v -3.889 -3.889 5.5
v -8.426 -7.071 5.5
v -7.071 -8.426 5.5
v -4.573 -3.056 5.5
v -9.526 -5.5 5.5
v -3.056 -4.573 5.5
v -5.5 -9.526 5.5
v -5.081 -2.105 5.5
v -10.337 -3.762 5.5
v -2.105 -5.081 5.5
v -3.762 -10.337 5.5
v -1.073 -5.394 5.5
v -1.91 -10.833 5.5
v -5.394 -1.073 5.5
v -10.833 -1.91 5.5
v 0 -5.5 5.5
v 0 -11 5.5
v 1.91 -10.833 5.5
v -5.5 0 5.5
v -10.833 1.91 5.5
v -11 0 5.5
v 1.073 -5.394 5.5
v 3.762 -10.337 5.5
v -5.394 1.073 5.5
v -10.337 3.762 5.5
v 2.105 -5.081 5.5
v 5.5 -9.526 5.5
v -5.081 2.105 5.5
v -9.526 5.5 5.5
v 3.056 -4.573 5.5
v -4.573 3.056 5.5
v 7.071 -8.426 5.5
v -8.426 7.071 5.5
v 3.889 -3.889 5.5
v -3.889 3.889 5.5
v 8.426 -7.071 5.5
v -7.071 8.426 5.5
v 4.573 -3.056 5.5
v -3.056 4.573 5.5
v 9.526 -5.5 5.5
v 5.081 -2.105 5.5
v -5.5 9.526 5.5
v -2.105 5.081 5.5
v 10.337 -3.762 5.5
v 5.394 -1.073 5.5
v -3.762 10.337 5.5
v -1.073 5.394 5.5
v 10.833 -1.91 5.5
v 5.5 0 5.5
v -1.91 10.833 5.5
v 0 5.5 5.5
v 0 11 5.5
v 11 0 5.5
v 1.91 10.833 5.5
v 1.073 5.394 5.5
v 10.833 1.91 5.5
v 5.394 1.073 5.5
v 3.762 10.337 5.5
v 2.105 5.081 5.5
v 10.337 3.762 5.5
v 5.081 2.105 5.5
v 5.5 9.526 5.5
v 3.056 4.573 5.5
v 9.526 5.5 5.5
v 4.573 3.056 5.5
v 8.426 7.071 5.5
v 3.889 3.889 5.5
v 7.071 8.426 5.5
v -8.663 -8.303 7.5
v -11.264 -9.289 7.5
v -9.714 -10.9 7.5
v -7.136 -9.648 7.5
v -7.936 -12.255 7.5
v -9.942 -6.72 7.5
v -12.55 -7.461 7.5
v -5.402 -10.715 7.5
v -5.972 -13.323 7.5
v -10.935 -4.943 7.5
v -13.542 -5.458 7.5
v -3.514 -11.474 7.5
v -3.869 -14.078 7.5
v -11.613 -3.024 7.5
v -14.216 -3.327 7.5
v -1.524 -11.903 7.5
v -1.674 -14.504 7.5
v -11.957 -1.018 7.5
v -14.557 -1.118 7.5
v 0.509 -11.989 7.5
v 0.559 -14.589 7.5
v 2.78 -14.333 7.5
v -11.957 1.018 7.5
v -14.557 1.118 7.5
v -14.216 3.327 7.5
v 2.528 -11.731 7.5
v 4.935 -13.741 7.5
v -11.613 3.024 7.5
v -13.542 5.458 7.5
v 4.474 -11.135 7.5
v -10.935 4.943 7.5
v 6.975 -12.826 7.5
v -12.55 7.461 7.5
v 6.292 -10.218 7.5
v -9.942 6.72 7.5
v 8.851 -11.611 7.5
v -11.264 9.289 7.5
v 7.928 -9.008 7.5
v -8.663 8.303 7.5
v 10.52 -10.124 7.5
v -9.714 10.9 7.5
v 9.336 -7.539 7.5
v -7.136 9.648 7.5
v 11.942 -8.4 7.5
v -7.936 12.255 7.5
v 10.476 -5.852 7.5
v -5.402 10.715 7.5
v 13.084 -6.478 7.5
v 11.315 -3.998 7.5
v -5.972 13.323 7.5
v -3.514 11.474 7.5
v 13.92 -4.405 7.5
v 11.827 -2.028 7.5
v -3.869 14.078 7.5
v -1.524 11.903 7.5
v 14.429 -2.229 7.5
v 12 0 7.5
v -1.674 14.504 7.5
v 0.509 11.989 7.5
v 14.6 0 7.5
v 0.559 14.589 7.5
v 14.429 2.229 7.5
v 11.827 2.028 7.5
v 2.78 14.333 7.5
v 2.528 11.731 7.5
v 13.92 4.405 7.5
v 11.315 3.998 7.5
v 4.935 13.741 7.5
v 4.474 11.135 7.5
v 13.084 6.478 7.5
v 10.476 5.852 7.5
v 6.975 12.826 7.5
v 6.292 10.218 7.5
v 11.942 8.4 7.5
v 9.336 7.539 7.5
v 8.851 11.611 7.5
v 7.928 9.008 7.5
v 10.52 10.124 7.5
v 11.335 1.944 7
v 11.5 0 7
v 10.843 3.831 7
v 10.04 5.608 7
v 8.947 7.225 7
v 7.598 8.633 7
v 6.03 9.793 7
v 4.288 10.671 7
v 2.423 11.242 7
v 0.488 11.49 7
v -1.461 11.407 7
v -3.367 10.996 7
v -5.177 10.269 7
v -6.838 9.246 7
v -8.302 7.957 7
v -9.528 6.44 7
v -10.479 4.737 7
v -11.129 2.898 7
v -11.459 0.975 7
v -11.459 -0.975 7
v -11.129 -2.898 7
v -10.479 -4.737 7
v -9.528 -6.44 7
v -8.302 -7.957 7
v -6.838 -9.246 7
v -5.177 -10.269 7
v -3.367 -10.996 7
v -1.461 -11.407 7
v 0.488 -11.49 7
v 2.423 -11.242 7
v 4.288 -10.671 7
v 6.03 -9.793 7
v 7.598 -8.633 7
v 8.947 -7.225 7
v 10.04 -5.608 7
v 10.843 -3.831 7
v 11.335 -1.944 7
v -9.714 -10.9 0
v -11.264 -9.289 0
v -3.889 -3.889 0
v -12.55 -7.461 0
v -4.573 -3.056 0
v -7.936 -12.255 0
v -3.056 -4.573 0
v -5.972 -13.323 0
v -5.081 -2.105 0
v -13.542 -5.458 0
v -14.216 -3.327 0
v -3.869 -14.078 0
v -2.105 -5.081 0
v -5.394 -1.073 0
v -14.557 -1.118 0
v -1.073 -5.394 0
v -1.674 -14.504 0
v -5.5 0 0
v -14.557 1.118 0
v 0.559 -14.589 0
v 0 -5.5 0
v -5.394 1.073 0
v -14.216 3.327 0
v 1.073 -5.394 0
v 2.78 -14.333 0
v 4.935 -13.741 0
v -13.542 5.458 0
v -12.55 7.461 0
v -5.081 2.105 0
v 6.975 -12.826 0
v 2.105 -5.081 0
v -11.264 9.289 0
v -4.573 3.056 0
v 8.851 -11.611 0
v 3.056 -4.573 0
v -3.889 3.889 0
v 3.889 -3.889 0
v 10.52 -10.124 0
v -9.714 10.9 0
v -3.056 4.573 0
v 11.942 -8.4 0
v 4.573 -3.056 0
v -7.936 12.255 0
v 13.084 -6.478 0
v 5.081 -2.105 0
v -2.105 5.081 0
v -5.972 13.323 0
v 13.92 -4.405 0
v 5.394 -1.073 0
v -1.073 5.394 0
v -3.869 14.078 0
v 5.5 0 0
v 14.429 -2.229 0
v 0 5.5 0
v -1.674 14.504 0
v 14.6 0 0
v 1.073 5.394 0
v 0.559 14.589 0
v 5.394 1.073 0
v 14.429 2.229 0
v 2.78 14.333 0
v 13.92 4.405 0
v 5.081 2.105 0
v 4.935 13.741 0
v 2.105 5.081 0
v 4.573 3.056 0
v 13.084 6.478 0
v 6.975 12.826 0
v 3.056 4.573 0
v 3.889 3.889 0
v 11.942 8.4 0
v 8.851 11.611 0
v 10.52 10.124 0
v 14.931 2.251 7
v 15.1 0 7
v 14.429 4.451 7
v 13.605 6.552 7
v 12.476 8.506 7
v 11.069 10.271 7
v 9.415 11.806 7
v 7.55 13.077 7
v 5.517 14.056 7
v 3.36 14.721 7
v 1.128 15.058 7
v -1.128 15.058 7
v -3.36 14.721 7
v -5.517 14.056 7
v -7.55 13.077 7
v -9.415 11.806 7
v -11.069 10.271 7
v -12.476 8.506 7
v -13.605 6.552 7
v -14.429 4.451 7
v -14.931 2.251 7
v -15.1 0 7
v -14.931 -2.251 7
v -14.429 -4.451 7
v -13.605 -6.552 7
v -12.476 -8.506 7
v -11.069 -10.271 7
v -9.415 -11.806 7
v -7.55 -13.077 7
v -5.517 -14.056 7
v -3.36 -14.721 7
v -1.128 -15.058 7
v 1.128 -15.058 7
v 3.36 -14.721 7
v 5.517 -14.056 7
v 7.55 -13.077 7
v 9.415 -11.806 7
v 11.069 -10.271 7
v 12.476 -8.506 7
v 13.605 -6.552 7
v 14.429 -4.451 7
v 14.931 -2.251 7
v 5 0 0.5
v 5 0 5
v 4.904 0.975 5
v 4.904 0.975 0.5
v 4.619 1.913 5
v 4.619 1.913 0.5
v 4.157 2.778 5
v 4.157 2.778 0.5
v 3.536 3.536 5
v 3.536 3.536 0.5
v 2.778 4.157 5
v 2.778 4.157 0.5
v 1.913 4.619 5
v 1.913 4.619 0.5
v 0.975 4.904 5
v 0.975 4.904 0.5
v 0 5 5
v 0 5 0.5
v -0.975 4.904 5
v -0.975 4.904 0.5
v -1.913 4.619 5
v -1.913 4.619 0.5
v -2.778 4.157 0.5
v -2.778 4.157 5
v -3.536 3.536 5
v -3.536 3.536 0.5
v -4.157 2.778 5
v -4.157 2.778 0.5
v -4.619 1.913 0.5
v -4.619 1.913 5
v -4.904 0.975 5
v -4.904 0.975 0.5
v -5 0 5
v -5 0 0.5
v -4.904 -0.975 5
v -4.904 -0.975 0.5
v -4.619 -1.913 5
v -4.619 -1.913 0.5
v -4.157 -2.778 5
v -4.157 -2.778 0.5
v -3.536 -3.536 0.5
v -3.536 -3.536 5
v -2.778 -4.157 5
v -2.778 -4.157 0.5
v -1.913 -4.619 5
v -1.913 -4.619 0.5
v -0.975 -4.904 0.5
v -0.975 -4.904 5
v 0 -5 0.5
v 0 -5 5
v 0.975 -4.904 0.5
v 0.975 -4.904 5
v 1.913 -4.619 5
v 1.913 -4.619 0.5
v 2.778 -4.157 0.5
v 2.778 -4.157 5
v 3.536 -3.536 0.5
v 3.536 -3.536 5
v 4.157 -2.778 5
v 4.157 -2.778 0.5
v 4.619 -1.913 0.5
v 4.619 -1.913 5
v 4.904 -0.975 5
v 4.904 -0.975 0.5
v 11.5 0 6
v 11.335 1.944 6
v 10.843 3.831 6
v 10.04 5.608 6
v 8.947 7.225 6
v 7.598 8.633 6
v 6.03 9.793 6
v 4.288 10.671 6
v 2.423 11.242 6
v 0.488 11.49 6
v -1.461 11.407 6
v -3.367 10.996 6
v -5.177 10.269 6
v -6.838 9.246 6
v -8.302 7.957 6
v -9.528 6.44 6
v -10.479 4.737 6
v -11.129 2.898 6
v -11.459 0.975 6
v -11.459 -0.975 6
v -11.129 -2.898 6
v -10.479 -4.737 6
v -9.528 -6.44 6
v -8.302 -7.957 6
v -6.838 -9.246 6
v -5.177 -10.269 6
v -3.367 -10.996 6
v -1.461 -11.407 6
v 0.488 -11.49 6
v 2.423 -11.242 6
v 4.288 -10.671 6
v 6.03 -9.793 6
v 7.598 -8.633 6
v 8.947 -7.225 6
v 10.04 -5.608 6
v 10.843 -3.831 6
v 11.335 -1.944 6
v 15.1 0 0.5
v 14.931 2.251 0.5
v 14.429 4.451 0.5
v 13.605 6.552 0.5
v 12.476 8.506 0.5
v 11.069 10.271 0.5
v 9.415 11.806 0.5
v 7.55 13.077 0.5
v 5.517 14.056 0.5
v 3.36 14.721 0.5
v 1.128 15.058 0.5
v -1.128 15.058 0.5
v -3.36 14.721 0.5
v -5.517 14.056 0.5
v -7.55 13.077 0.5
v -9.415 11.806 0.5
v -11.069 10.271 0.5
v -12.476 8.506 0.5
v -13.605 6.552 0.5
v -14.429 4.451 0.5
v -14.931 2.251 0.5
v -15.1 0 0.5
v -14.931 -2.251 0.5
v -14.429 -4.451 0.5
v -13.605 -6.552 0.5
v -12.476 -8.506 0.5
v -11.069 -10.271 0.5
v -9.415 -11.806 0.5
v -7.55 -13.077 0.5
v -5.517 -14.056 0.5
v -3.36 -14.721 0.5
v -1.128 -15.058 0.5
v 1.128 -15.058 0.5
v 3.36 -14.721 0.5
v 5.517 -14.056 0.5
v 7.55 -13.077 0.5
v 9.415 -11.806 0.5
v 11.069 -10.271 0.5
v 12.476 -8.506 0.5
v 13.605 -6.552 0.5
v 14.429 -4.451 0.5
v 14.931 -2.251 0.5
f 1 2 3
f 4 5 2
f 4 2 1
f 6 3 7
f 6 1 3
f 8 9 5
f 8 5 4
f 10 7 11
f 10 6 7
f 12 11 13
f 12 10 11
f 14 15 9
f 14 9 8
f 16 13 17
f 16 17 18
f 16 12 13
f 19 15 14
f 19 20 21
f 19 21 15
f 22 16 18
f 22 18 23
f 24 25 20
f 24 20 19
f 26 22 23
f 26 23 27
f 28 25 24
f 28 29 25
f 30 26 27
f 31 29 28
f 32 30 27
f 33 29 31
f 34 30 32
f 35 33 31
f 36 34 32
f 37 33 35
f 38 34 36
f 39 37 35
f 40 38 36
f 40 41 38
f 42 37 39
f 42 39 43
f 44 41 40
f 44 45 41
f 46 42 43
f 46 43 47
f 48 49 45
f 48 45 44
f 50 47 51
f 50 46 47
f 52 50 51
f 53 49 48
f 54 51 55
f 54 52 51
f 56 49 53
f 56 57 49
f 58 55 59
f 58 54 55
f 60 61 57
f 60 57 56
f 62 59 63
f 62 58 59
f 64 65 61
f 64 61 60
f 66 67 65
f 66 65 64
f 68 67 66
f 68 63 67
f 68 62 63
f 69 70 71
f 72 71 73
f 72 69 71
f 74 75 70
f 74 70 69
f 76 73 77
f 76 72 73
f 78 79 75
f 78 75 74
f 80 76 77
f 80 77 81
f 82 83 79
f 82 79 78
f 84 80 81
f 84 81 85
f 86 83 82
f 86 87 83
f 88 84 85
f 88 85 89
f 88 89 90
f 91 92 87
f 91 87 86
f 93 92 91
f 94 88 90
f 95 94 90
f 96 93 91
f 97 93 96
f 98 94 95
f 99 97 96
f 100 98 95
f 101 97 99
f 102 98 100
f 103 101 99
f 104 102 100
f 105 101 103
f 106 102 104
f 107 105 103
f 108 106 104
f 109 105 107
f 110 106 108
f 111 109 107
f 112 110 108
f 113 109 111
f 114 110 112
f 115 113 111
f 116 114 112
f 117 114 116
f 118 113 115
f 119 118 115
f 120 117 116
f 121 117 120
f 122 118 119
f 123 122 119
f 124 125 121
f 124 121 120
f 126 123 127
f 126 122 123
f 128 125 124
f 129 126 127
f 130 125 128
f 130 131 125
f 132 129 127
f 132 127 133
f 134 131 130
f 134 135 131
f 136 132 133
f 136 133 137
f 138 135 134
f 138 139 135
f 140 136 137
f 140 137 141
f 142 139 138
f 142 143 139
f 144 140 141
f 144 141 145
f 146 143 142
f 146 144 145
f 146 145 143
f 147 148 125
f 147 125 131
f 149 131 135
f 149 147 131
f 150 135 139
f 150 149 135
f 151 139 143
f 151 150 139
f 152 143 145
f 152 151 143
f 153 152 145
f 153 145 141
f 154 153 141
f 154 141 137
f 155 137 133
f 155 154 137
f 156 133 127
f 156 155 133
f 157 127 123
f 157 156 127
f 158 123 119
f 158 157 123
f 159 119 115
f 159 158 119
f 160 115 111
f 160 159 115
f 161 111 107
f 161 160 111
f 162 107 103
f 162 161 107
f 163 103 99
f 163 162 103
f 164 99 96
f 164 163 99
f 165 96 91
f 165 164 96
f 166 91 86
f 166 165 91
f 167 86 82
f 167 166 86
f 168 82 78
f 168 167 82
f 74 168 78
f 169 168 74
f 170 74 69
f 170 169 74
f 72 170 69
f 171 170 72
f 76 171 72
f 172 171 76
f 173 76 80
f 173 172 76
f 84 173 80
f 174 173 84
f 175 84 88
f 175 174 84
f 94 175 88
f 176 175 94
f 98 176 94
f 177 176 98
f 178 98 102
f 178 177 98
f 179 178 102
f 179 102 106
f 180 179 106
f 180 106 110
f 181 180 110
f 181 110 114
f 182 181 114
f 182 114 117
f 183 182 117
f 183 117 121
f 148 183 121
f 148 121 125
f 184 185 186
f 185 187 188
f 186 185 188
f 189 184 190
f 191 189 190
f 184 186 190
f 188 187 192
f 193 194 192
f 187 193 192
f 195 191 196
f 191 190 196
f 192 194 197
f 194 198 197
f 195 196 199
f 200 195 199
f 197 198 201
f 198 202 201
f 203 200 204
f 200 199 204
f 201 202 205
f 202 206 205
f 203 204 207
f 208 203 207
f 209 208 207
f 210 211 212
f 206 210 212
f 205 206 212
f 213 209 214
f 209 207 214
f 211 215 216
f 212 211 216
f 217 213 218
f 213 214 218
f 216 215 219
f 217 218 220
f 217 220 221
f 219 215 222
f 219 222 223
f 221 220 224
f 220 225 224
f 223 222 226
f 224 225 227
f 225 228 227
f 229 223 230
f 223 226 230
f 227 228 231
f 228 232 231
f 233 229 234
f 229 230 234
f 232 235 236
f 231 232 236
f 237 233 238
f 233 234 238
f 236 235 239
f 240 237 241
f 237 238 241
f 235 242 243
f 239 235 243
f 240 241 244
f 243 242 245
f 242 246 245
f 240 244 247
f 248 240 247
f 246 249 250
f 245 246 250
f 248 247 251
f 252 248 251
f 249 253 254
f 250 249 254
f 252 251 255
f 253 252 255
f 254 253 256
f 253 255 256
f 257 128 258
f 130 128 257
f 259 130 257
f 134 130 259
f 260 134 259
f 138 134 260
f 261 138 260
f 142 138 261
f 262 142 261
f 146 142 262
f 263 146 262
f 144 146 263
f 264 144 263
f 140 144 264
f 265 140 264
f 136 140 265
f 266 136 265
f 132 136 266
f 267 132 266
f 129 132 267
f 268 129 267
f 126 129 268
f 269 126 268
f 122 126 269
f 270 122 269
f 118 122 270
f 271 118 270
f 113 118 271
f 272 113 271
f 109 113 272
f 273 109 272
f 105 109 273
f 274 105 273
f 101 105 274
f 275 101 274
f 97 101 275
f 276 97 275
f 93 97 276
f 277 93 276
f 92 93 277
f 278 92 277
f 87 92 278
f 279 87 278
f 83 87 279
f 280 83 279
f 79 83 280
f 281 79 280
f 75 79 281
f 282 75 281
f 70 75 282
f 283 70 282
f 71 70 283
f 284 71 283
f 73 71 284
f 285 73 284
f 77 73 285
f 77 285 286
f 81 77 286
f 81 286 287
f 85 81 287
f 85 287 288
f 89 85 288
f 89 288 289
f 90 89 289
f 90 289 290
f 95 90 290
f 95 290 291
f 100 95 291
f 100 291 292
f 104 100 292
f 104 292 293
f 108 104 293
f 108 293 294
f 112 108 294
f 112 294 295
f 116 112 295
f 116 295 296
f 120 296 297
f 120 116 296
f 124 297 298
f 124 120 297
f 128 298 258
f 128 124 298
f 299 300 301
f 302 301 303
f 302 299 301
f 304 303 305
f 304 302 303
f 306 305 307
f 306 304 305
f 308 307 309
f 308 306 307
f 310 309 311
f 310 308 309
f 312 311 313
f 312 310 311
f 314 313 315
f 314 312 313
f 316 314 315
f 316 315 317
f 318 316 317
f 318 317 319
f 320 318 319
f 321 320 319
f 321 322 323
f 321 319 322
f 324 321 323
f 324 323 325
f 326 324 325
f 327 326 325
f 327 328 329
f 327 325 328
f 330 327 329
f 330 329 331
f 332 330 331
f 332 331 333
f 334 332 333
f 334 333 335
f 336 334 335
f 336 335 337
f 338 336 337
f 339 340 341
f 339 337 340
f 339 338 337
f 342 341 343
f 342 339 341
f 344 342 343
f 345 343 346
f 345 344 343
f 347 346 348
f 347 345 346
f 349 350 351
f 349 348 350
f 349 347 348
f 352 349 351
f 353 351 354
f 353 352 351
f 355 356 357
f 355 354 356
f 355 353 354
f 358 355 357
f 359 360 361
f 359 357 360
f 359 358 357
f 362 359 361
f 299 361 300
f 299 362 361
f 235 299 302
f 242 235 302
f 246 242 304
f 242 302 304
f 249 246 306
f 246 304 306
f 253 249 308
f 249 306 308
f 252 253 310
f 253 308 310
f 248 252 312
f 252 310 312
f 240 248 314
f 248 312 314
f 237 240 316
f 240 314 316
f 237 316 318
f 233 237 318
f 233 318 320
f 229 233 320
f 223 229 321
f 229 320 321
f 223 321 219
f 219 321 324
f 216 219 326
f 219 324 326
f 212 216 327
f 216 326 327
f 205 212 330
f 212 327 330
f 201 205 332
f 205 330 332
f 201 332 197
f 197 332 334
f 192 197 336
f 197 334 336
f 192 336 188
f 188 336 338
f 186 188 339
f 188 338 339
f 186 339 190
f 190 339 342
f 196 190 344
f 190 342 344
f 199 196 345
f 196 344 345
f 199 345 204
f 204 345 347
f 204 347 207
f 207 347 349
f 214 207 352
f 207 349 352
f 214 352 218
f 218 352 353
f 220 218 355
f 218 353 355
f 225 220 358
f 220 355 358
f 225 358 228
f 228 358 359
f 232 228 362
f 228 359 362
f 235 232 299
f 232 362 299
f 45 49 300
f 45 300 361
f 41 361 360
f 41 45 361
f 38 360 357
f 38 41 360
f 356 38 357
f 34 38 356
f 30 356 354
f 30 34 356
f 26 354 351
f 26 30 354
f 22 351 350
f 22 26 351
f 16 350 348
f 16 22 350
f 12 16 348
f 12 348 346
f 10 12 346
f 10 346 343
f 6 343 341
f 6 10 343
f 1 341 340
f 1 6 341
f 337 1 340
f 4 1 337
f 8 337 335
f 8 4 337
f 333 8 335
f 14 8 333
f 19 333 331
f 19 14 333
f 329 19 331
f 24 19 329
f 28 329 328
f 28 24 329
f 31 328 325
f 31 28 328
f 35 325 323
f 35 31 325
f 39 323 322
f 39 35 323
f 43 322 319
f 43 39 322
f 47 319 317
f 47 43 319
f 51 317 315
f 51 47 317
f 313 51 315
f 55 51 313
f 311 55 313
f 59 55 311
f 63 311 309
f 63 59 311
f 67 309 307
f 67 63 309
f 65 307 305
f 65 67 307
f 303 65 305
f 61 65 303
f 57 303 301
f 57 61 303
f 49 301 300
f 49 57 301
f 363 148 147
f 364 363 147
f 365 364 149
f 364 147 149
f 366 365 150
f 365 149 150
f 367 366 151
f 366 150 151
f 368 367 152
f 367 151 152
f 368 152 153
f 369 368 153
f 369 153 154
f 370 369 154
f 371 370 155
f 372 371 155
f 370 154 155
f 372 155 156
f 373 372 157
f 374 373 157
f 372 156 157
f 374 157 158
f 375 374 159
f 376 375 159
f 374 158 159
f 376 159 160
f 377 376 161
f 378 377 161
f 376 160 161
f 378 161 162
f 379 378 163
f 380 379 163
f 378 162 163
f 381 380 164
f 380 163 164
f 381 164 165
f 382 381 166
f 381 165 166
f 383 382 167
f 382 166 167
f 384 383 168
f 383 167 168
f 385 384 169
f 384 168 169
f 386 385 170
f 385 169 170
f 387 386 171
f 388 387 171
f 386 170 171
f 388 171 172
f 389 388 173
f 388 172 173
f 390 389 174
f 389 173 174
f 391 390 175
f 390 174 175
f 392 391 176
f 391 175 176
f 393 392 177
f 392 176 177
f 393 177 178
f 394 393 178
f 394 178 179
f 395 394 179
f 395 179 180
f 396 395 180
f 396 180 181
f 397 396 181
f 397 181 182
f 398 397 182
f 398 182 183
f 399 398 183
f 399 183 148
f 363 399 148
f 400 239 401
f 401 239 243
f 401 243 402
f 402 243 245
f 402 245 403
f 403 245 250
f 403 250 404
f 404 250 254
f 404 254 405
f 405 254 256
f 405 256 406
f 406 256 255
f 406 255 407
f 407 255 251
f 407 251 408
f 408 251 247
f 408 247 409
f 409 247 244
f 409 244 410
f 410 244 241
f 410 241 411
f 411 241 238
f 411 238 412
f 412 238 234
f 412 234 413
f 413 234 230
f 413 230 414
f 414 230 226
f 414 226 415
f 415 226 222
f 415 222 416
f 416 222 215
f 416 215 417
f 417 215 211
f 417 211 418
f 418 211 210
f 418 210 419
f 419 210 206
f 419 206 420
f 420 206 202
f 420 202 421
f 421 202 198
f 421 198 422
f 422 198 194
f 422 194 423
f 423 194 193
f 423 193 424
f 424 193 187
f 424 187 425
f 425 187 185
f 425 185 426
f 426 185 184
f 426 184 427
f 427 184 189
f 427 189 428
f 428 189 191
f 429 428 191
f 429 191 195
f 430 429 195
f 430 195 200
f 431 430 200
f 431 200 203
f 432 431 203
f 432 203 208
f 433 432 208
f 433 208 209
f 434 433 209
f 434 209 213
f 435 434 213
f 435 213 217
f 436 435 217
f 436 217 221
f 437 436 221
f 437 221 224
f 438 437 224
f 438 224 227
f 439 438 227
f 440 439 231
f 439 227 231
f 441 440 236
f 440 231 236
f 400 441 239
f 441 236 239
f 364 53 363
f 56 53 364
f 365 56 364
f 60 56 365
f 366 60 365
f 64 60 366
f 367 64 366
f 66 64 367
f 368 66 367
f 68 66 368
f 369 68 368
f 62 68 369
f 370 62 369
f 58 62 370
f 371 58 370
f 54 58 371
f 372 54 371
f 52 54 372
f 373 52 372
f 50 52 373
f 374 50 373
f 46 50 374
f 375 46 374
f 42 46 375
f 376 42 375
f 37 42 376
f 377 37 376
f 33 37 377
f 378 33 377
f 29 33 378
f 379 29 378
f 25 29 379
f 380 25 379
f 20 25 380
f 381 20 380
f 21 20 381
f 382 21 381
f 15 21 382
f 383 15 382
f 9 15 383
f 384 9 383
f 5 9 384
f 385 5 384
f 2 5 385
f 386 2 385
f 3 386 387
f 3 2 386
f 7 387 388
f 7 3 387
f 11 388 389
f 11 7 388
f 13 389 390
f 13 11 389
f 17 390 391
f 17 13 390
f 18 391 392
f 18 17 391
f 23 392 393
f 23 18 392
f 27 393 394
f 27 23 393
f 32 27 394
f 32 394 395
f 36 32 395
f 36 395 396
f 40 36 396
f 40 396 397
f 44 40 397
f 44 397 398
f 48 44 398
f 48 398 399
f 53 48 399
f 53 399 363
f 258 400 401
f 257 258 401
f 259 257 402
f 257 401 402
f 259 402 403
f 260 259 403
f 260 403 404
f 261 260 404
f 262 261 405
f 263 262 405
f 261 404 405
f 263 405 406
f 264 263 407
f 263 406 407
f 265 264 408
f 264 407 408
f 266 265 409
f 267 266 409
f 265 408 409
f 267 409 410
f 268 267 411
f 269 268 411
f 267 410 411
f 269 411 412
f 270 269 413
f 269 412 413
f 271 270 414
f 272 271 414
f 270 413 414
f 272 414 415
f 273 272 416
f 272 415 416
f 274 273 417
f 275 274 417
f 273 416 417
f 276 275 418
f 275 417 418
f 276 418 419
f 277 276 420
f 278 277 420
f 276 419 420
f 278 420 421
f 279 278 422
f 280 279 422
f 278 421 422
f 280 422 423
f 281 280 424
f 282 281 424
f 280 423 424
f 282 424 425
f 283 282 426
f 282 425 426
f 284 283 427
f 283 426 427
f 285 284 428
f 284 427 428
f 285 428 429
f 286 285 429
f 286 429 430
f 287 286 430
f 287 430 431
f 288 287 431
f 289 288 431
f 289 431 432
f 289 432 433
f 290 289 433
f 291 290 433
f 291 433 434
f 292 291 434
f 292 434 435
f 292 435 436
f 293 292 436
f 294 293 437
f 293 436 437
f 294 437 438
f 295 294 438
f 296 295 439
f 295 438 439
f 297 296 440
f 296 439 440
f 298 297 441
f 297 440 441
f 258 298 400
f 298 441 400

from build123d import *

# Parameters (mm, degrees)
SKETCH2_R           = 15.1
SKETCH2_R_2         = 5
BOSS_EXTRUDE1_DEPTH = 7.5
SKETCH3_R           = 11.5
CUT_EXTRUDE1_DEPTH  = 2
CHAMFER1_SIZE       = 0.5


with BuildPart() as part:
    # Sketch2 → Boss-Extrude1 (new body)
    with BuildSketch(Plane.XY):
        Circle(SKETCH2_R)
        Circle(SKETCH2_R_2, mode=Mode.SUBTRACT)
    extrude(amount=BOSS_EXTRUDE1_DEPTH)

    # Sketch3 → Cut-Extrude1 (cut)
    with BuildSketch(Plane.XY.offset(7.5)):
        Circle(SKETCH3_R)
    extrude(amount=-CUT_EXTRUDE1_DEPTH, mode=Mode.SUBTRACT)

    # Chamfer1
    chamfer1_edges = [part.edges().sort_by_distance(p)[0] for p in [
        (-11.5, 0, 5.5),
        (-5, 0, 5.5),
        (-11.5, 0, 7.5),
        (-15.1, 0, 0),
        (-15.1, 0, 7.5),
        (-5, 0, 0),
    ]]
    chamfer(chamfer1_edges, length=CHAMFER1_SIZE)


solid = part.part
